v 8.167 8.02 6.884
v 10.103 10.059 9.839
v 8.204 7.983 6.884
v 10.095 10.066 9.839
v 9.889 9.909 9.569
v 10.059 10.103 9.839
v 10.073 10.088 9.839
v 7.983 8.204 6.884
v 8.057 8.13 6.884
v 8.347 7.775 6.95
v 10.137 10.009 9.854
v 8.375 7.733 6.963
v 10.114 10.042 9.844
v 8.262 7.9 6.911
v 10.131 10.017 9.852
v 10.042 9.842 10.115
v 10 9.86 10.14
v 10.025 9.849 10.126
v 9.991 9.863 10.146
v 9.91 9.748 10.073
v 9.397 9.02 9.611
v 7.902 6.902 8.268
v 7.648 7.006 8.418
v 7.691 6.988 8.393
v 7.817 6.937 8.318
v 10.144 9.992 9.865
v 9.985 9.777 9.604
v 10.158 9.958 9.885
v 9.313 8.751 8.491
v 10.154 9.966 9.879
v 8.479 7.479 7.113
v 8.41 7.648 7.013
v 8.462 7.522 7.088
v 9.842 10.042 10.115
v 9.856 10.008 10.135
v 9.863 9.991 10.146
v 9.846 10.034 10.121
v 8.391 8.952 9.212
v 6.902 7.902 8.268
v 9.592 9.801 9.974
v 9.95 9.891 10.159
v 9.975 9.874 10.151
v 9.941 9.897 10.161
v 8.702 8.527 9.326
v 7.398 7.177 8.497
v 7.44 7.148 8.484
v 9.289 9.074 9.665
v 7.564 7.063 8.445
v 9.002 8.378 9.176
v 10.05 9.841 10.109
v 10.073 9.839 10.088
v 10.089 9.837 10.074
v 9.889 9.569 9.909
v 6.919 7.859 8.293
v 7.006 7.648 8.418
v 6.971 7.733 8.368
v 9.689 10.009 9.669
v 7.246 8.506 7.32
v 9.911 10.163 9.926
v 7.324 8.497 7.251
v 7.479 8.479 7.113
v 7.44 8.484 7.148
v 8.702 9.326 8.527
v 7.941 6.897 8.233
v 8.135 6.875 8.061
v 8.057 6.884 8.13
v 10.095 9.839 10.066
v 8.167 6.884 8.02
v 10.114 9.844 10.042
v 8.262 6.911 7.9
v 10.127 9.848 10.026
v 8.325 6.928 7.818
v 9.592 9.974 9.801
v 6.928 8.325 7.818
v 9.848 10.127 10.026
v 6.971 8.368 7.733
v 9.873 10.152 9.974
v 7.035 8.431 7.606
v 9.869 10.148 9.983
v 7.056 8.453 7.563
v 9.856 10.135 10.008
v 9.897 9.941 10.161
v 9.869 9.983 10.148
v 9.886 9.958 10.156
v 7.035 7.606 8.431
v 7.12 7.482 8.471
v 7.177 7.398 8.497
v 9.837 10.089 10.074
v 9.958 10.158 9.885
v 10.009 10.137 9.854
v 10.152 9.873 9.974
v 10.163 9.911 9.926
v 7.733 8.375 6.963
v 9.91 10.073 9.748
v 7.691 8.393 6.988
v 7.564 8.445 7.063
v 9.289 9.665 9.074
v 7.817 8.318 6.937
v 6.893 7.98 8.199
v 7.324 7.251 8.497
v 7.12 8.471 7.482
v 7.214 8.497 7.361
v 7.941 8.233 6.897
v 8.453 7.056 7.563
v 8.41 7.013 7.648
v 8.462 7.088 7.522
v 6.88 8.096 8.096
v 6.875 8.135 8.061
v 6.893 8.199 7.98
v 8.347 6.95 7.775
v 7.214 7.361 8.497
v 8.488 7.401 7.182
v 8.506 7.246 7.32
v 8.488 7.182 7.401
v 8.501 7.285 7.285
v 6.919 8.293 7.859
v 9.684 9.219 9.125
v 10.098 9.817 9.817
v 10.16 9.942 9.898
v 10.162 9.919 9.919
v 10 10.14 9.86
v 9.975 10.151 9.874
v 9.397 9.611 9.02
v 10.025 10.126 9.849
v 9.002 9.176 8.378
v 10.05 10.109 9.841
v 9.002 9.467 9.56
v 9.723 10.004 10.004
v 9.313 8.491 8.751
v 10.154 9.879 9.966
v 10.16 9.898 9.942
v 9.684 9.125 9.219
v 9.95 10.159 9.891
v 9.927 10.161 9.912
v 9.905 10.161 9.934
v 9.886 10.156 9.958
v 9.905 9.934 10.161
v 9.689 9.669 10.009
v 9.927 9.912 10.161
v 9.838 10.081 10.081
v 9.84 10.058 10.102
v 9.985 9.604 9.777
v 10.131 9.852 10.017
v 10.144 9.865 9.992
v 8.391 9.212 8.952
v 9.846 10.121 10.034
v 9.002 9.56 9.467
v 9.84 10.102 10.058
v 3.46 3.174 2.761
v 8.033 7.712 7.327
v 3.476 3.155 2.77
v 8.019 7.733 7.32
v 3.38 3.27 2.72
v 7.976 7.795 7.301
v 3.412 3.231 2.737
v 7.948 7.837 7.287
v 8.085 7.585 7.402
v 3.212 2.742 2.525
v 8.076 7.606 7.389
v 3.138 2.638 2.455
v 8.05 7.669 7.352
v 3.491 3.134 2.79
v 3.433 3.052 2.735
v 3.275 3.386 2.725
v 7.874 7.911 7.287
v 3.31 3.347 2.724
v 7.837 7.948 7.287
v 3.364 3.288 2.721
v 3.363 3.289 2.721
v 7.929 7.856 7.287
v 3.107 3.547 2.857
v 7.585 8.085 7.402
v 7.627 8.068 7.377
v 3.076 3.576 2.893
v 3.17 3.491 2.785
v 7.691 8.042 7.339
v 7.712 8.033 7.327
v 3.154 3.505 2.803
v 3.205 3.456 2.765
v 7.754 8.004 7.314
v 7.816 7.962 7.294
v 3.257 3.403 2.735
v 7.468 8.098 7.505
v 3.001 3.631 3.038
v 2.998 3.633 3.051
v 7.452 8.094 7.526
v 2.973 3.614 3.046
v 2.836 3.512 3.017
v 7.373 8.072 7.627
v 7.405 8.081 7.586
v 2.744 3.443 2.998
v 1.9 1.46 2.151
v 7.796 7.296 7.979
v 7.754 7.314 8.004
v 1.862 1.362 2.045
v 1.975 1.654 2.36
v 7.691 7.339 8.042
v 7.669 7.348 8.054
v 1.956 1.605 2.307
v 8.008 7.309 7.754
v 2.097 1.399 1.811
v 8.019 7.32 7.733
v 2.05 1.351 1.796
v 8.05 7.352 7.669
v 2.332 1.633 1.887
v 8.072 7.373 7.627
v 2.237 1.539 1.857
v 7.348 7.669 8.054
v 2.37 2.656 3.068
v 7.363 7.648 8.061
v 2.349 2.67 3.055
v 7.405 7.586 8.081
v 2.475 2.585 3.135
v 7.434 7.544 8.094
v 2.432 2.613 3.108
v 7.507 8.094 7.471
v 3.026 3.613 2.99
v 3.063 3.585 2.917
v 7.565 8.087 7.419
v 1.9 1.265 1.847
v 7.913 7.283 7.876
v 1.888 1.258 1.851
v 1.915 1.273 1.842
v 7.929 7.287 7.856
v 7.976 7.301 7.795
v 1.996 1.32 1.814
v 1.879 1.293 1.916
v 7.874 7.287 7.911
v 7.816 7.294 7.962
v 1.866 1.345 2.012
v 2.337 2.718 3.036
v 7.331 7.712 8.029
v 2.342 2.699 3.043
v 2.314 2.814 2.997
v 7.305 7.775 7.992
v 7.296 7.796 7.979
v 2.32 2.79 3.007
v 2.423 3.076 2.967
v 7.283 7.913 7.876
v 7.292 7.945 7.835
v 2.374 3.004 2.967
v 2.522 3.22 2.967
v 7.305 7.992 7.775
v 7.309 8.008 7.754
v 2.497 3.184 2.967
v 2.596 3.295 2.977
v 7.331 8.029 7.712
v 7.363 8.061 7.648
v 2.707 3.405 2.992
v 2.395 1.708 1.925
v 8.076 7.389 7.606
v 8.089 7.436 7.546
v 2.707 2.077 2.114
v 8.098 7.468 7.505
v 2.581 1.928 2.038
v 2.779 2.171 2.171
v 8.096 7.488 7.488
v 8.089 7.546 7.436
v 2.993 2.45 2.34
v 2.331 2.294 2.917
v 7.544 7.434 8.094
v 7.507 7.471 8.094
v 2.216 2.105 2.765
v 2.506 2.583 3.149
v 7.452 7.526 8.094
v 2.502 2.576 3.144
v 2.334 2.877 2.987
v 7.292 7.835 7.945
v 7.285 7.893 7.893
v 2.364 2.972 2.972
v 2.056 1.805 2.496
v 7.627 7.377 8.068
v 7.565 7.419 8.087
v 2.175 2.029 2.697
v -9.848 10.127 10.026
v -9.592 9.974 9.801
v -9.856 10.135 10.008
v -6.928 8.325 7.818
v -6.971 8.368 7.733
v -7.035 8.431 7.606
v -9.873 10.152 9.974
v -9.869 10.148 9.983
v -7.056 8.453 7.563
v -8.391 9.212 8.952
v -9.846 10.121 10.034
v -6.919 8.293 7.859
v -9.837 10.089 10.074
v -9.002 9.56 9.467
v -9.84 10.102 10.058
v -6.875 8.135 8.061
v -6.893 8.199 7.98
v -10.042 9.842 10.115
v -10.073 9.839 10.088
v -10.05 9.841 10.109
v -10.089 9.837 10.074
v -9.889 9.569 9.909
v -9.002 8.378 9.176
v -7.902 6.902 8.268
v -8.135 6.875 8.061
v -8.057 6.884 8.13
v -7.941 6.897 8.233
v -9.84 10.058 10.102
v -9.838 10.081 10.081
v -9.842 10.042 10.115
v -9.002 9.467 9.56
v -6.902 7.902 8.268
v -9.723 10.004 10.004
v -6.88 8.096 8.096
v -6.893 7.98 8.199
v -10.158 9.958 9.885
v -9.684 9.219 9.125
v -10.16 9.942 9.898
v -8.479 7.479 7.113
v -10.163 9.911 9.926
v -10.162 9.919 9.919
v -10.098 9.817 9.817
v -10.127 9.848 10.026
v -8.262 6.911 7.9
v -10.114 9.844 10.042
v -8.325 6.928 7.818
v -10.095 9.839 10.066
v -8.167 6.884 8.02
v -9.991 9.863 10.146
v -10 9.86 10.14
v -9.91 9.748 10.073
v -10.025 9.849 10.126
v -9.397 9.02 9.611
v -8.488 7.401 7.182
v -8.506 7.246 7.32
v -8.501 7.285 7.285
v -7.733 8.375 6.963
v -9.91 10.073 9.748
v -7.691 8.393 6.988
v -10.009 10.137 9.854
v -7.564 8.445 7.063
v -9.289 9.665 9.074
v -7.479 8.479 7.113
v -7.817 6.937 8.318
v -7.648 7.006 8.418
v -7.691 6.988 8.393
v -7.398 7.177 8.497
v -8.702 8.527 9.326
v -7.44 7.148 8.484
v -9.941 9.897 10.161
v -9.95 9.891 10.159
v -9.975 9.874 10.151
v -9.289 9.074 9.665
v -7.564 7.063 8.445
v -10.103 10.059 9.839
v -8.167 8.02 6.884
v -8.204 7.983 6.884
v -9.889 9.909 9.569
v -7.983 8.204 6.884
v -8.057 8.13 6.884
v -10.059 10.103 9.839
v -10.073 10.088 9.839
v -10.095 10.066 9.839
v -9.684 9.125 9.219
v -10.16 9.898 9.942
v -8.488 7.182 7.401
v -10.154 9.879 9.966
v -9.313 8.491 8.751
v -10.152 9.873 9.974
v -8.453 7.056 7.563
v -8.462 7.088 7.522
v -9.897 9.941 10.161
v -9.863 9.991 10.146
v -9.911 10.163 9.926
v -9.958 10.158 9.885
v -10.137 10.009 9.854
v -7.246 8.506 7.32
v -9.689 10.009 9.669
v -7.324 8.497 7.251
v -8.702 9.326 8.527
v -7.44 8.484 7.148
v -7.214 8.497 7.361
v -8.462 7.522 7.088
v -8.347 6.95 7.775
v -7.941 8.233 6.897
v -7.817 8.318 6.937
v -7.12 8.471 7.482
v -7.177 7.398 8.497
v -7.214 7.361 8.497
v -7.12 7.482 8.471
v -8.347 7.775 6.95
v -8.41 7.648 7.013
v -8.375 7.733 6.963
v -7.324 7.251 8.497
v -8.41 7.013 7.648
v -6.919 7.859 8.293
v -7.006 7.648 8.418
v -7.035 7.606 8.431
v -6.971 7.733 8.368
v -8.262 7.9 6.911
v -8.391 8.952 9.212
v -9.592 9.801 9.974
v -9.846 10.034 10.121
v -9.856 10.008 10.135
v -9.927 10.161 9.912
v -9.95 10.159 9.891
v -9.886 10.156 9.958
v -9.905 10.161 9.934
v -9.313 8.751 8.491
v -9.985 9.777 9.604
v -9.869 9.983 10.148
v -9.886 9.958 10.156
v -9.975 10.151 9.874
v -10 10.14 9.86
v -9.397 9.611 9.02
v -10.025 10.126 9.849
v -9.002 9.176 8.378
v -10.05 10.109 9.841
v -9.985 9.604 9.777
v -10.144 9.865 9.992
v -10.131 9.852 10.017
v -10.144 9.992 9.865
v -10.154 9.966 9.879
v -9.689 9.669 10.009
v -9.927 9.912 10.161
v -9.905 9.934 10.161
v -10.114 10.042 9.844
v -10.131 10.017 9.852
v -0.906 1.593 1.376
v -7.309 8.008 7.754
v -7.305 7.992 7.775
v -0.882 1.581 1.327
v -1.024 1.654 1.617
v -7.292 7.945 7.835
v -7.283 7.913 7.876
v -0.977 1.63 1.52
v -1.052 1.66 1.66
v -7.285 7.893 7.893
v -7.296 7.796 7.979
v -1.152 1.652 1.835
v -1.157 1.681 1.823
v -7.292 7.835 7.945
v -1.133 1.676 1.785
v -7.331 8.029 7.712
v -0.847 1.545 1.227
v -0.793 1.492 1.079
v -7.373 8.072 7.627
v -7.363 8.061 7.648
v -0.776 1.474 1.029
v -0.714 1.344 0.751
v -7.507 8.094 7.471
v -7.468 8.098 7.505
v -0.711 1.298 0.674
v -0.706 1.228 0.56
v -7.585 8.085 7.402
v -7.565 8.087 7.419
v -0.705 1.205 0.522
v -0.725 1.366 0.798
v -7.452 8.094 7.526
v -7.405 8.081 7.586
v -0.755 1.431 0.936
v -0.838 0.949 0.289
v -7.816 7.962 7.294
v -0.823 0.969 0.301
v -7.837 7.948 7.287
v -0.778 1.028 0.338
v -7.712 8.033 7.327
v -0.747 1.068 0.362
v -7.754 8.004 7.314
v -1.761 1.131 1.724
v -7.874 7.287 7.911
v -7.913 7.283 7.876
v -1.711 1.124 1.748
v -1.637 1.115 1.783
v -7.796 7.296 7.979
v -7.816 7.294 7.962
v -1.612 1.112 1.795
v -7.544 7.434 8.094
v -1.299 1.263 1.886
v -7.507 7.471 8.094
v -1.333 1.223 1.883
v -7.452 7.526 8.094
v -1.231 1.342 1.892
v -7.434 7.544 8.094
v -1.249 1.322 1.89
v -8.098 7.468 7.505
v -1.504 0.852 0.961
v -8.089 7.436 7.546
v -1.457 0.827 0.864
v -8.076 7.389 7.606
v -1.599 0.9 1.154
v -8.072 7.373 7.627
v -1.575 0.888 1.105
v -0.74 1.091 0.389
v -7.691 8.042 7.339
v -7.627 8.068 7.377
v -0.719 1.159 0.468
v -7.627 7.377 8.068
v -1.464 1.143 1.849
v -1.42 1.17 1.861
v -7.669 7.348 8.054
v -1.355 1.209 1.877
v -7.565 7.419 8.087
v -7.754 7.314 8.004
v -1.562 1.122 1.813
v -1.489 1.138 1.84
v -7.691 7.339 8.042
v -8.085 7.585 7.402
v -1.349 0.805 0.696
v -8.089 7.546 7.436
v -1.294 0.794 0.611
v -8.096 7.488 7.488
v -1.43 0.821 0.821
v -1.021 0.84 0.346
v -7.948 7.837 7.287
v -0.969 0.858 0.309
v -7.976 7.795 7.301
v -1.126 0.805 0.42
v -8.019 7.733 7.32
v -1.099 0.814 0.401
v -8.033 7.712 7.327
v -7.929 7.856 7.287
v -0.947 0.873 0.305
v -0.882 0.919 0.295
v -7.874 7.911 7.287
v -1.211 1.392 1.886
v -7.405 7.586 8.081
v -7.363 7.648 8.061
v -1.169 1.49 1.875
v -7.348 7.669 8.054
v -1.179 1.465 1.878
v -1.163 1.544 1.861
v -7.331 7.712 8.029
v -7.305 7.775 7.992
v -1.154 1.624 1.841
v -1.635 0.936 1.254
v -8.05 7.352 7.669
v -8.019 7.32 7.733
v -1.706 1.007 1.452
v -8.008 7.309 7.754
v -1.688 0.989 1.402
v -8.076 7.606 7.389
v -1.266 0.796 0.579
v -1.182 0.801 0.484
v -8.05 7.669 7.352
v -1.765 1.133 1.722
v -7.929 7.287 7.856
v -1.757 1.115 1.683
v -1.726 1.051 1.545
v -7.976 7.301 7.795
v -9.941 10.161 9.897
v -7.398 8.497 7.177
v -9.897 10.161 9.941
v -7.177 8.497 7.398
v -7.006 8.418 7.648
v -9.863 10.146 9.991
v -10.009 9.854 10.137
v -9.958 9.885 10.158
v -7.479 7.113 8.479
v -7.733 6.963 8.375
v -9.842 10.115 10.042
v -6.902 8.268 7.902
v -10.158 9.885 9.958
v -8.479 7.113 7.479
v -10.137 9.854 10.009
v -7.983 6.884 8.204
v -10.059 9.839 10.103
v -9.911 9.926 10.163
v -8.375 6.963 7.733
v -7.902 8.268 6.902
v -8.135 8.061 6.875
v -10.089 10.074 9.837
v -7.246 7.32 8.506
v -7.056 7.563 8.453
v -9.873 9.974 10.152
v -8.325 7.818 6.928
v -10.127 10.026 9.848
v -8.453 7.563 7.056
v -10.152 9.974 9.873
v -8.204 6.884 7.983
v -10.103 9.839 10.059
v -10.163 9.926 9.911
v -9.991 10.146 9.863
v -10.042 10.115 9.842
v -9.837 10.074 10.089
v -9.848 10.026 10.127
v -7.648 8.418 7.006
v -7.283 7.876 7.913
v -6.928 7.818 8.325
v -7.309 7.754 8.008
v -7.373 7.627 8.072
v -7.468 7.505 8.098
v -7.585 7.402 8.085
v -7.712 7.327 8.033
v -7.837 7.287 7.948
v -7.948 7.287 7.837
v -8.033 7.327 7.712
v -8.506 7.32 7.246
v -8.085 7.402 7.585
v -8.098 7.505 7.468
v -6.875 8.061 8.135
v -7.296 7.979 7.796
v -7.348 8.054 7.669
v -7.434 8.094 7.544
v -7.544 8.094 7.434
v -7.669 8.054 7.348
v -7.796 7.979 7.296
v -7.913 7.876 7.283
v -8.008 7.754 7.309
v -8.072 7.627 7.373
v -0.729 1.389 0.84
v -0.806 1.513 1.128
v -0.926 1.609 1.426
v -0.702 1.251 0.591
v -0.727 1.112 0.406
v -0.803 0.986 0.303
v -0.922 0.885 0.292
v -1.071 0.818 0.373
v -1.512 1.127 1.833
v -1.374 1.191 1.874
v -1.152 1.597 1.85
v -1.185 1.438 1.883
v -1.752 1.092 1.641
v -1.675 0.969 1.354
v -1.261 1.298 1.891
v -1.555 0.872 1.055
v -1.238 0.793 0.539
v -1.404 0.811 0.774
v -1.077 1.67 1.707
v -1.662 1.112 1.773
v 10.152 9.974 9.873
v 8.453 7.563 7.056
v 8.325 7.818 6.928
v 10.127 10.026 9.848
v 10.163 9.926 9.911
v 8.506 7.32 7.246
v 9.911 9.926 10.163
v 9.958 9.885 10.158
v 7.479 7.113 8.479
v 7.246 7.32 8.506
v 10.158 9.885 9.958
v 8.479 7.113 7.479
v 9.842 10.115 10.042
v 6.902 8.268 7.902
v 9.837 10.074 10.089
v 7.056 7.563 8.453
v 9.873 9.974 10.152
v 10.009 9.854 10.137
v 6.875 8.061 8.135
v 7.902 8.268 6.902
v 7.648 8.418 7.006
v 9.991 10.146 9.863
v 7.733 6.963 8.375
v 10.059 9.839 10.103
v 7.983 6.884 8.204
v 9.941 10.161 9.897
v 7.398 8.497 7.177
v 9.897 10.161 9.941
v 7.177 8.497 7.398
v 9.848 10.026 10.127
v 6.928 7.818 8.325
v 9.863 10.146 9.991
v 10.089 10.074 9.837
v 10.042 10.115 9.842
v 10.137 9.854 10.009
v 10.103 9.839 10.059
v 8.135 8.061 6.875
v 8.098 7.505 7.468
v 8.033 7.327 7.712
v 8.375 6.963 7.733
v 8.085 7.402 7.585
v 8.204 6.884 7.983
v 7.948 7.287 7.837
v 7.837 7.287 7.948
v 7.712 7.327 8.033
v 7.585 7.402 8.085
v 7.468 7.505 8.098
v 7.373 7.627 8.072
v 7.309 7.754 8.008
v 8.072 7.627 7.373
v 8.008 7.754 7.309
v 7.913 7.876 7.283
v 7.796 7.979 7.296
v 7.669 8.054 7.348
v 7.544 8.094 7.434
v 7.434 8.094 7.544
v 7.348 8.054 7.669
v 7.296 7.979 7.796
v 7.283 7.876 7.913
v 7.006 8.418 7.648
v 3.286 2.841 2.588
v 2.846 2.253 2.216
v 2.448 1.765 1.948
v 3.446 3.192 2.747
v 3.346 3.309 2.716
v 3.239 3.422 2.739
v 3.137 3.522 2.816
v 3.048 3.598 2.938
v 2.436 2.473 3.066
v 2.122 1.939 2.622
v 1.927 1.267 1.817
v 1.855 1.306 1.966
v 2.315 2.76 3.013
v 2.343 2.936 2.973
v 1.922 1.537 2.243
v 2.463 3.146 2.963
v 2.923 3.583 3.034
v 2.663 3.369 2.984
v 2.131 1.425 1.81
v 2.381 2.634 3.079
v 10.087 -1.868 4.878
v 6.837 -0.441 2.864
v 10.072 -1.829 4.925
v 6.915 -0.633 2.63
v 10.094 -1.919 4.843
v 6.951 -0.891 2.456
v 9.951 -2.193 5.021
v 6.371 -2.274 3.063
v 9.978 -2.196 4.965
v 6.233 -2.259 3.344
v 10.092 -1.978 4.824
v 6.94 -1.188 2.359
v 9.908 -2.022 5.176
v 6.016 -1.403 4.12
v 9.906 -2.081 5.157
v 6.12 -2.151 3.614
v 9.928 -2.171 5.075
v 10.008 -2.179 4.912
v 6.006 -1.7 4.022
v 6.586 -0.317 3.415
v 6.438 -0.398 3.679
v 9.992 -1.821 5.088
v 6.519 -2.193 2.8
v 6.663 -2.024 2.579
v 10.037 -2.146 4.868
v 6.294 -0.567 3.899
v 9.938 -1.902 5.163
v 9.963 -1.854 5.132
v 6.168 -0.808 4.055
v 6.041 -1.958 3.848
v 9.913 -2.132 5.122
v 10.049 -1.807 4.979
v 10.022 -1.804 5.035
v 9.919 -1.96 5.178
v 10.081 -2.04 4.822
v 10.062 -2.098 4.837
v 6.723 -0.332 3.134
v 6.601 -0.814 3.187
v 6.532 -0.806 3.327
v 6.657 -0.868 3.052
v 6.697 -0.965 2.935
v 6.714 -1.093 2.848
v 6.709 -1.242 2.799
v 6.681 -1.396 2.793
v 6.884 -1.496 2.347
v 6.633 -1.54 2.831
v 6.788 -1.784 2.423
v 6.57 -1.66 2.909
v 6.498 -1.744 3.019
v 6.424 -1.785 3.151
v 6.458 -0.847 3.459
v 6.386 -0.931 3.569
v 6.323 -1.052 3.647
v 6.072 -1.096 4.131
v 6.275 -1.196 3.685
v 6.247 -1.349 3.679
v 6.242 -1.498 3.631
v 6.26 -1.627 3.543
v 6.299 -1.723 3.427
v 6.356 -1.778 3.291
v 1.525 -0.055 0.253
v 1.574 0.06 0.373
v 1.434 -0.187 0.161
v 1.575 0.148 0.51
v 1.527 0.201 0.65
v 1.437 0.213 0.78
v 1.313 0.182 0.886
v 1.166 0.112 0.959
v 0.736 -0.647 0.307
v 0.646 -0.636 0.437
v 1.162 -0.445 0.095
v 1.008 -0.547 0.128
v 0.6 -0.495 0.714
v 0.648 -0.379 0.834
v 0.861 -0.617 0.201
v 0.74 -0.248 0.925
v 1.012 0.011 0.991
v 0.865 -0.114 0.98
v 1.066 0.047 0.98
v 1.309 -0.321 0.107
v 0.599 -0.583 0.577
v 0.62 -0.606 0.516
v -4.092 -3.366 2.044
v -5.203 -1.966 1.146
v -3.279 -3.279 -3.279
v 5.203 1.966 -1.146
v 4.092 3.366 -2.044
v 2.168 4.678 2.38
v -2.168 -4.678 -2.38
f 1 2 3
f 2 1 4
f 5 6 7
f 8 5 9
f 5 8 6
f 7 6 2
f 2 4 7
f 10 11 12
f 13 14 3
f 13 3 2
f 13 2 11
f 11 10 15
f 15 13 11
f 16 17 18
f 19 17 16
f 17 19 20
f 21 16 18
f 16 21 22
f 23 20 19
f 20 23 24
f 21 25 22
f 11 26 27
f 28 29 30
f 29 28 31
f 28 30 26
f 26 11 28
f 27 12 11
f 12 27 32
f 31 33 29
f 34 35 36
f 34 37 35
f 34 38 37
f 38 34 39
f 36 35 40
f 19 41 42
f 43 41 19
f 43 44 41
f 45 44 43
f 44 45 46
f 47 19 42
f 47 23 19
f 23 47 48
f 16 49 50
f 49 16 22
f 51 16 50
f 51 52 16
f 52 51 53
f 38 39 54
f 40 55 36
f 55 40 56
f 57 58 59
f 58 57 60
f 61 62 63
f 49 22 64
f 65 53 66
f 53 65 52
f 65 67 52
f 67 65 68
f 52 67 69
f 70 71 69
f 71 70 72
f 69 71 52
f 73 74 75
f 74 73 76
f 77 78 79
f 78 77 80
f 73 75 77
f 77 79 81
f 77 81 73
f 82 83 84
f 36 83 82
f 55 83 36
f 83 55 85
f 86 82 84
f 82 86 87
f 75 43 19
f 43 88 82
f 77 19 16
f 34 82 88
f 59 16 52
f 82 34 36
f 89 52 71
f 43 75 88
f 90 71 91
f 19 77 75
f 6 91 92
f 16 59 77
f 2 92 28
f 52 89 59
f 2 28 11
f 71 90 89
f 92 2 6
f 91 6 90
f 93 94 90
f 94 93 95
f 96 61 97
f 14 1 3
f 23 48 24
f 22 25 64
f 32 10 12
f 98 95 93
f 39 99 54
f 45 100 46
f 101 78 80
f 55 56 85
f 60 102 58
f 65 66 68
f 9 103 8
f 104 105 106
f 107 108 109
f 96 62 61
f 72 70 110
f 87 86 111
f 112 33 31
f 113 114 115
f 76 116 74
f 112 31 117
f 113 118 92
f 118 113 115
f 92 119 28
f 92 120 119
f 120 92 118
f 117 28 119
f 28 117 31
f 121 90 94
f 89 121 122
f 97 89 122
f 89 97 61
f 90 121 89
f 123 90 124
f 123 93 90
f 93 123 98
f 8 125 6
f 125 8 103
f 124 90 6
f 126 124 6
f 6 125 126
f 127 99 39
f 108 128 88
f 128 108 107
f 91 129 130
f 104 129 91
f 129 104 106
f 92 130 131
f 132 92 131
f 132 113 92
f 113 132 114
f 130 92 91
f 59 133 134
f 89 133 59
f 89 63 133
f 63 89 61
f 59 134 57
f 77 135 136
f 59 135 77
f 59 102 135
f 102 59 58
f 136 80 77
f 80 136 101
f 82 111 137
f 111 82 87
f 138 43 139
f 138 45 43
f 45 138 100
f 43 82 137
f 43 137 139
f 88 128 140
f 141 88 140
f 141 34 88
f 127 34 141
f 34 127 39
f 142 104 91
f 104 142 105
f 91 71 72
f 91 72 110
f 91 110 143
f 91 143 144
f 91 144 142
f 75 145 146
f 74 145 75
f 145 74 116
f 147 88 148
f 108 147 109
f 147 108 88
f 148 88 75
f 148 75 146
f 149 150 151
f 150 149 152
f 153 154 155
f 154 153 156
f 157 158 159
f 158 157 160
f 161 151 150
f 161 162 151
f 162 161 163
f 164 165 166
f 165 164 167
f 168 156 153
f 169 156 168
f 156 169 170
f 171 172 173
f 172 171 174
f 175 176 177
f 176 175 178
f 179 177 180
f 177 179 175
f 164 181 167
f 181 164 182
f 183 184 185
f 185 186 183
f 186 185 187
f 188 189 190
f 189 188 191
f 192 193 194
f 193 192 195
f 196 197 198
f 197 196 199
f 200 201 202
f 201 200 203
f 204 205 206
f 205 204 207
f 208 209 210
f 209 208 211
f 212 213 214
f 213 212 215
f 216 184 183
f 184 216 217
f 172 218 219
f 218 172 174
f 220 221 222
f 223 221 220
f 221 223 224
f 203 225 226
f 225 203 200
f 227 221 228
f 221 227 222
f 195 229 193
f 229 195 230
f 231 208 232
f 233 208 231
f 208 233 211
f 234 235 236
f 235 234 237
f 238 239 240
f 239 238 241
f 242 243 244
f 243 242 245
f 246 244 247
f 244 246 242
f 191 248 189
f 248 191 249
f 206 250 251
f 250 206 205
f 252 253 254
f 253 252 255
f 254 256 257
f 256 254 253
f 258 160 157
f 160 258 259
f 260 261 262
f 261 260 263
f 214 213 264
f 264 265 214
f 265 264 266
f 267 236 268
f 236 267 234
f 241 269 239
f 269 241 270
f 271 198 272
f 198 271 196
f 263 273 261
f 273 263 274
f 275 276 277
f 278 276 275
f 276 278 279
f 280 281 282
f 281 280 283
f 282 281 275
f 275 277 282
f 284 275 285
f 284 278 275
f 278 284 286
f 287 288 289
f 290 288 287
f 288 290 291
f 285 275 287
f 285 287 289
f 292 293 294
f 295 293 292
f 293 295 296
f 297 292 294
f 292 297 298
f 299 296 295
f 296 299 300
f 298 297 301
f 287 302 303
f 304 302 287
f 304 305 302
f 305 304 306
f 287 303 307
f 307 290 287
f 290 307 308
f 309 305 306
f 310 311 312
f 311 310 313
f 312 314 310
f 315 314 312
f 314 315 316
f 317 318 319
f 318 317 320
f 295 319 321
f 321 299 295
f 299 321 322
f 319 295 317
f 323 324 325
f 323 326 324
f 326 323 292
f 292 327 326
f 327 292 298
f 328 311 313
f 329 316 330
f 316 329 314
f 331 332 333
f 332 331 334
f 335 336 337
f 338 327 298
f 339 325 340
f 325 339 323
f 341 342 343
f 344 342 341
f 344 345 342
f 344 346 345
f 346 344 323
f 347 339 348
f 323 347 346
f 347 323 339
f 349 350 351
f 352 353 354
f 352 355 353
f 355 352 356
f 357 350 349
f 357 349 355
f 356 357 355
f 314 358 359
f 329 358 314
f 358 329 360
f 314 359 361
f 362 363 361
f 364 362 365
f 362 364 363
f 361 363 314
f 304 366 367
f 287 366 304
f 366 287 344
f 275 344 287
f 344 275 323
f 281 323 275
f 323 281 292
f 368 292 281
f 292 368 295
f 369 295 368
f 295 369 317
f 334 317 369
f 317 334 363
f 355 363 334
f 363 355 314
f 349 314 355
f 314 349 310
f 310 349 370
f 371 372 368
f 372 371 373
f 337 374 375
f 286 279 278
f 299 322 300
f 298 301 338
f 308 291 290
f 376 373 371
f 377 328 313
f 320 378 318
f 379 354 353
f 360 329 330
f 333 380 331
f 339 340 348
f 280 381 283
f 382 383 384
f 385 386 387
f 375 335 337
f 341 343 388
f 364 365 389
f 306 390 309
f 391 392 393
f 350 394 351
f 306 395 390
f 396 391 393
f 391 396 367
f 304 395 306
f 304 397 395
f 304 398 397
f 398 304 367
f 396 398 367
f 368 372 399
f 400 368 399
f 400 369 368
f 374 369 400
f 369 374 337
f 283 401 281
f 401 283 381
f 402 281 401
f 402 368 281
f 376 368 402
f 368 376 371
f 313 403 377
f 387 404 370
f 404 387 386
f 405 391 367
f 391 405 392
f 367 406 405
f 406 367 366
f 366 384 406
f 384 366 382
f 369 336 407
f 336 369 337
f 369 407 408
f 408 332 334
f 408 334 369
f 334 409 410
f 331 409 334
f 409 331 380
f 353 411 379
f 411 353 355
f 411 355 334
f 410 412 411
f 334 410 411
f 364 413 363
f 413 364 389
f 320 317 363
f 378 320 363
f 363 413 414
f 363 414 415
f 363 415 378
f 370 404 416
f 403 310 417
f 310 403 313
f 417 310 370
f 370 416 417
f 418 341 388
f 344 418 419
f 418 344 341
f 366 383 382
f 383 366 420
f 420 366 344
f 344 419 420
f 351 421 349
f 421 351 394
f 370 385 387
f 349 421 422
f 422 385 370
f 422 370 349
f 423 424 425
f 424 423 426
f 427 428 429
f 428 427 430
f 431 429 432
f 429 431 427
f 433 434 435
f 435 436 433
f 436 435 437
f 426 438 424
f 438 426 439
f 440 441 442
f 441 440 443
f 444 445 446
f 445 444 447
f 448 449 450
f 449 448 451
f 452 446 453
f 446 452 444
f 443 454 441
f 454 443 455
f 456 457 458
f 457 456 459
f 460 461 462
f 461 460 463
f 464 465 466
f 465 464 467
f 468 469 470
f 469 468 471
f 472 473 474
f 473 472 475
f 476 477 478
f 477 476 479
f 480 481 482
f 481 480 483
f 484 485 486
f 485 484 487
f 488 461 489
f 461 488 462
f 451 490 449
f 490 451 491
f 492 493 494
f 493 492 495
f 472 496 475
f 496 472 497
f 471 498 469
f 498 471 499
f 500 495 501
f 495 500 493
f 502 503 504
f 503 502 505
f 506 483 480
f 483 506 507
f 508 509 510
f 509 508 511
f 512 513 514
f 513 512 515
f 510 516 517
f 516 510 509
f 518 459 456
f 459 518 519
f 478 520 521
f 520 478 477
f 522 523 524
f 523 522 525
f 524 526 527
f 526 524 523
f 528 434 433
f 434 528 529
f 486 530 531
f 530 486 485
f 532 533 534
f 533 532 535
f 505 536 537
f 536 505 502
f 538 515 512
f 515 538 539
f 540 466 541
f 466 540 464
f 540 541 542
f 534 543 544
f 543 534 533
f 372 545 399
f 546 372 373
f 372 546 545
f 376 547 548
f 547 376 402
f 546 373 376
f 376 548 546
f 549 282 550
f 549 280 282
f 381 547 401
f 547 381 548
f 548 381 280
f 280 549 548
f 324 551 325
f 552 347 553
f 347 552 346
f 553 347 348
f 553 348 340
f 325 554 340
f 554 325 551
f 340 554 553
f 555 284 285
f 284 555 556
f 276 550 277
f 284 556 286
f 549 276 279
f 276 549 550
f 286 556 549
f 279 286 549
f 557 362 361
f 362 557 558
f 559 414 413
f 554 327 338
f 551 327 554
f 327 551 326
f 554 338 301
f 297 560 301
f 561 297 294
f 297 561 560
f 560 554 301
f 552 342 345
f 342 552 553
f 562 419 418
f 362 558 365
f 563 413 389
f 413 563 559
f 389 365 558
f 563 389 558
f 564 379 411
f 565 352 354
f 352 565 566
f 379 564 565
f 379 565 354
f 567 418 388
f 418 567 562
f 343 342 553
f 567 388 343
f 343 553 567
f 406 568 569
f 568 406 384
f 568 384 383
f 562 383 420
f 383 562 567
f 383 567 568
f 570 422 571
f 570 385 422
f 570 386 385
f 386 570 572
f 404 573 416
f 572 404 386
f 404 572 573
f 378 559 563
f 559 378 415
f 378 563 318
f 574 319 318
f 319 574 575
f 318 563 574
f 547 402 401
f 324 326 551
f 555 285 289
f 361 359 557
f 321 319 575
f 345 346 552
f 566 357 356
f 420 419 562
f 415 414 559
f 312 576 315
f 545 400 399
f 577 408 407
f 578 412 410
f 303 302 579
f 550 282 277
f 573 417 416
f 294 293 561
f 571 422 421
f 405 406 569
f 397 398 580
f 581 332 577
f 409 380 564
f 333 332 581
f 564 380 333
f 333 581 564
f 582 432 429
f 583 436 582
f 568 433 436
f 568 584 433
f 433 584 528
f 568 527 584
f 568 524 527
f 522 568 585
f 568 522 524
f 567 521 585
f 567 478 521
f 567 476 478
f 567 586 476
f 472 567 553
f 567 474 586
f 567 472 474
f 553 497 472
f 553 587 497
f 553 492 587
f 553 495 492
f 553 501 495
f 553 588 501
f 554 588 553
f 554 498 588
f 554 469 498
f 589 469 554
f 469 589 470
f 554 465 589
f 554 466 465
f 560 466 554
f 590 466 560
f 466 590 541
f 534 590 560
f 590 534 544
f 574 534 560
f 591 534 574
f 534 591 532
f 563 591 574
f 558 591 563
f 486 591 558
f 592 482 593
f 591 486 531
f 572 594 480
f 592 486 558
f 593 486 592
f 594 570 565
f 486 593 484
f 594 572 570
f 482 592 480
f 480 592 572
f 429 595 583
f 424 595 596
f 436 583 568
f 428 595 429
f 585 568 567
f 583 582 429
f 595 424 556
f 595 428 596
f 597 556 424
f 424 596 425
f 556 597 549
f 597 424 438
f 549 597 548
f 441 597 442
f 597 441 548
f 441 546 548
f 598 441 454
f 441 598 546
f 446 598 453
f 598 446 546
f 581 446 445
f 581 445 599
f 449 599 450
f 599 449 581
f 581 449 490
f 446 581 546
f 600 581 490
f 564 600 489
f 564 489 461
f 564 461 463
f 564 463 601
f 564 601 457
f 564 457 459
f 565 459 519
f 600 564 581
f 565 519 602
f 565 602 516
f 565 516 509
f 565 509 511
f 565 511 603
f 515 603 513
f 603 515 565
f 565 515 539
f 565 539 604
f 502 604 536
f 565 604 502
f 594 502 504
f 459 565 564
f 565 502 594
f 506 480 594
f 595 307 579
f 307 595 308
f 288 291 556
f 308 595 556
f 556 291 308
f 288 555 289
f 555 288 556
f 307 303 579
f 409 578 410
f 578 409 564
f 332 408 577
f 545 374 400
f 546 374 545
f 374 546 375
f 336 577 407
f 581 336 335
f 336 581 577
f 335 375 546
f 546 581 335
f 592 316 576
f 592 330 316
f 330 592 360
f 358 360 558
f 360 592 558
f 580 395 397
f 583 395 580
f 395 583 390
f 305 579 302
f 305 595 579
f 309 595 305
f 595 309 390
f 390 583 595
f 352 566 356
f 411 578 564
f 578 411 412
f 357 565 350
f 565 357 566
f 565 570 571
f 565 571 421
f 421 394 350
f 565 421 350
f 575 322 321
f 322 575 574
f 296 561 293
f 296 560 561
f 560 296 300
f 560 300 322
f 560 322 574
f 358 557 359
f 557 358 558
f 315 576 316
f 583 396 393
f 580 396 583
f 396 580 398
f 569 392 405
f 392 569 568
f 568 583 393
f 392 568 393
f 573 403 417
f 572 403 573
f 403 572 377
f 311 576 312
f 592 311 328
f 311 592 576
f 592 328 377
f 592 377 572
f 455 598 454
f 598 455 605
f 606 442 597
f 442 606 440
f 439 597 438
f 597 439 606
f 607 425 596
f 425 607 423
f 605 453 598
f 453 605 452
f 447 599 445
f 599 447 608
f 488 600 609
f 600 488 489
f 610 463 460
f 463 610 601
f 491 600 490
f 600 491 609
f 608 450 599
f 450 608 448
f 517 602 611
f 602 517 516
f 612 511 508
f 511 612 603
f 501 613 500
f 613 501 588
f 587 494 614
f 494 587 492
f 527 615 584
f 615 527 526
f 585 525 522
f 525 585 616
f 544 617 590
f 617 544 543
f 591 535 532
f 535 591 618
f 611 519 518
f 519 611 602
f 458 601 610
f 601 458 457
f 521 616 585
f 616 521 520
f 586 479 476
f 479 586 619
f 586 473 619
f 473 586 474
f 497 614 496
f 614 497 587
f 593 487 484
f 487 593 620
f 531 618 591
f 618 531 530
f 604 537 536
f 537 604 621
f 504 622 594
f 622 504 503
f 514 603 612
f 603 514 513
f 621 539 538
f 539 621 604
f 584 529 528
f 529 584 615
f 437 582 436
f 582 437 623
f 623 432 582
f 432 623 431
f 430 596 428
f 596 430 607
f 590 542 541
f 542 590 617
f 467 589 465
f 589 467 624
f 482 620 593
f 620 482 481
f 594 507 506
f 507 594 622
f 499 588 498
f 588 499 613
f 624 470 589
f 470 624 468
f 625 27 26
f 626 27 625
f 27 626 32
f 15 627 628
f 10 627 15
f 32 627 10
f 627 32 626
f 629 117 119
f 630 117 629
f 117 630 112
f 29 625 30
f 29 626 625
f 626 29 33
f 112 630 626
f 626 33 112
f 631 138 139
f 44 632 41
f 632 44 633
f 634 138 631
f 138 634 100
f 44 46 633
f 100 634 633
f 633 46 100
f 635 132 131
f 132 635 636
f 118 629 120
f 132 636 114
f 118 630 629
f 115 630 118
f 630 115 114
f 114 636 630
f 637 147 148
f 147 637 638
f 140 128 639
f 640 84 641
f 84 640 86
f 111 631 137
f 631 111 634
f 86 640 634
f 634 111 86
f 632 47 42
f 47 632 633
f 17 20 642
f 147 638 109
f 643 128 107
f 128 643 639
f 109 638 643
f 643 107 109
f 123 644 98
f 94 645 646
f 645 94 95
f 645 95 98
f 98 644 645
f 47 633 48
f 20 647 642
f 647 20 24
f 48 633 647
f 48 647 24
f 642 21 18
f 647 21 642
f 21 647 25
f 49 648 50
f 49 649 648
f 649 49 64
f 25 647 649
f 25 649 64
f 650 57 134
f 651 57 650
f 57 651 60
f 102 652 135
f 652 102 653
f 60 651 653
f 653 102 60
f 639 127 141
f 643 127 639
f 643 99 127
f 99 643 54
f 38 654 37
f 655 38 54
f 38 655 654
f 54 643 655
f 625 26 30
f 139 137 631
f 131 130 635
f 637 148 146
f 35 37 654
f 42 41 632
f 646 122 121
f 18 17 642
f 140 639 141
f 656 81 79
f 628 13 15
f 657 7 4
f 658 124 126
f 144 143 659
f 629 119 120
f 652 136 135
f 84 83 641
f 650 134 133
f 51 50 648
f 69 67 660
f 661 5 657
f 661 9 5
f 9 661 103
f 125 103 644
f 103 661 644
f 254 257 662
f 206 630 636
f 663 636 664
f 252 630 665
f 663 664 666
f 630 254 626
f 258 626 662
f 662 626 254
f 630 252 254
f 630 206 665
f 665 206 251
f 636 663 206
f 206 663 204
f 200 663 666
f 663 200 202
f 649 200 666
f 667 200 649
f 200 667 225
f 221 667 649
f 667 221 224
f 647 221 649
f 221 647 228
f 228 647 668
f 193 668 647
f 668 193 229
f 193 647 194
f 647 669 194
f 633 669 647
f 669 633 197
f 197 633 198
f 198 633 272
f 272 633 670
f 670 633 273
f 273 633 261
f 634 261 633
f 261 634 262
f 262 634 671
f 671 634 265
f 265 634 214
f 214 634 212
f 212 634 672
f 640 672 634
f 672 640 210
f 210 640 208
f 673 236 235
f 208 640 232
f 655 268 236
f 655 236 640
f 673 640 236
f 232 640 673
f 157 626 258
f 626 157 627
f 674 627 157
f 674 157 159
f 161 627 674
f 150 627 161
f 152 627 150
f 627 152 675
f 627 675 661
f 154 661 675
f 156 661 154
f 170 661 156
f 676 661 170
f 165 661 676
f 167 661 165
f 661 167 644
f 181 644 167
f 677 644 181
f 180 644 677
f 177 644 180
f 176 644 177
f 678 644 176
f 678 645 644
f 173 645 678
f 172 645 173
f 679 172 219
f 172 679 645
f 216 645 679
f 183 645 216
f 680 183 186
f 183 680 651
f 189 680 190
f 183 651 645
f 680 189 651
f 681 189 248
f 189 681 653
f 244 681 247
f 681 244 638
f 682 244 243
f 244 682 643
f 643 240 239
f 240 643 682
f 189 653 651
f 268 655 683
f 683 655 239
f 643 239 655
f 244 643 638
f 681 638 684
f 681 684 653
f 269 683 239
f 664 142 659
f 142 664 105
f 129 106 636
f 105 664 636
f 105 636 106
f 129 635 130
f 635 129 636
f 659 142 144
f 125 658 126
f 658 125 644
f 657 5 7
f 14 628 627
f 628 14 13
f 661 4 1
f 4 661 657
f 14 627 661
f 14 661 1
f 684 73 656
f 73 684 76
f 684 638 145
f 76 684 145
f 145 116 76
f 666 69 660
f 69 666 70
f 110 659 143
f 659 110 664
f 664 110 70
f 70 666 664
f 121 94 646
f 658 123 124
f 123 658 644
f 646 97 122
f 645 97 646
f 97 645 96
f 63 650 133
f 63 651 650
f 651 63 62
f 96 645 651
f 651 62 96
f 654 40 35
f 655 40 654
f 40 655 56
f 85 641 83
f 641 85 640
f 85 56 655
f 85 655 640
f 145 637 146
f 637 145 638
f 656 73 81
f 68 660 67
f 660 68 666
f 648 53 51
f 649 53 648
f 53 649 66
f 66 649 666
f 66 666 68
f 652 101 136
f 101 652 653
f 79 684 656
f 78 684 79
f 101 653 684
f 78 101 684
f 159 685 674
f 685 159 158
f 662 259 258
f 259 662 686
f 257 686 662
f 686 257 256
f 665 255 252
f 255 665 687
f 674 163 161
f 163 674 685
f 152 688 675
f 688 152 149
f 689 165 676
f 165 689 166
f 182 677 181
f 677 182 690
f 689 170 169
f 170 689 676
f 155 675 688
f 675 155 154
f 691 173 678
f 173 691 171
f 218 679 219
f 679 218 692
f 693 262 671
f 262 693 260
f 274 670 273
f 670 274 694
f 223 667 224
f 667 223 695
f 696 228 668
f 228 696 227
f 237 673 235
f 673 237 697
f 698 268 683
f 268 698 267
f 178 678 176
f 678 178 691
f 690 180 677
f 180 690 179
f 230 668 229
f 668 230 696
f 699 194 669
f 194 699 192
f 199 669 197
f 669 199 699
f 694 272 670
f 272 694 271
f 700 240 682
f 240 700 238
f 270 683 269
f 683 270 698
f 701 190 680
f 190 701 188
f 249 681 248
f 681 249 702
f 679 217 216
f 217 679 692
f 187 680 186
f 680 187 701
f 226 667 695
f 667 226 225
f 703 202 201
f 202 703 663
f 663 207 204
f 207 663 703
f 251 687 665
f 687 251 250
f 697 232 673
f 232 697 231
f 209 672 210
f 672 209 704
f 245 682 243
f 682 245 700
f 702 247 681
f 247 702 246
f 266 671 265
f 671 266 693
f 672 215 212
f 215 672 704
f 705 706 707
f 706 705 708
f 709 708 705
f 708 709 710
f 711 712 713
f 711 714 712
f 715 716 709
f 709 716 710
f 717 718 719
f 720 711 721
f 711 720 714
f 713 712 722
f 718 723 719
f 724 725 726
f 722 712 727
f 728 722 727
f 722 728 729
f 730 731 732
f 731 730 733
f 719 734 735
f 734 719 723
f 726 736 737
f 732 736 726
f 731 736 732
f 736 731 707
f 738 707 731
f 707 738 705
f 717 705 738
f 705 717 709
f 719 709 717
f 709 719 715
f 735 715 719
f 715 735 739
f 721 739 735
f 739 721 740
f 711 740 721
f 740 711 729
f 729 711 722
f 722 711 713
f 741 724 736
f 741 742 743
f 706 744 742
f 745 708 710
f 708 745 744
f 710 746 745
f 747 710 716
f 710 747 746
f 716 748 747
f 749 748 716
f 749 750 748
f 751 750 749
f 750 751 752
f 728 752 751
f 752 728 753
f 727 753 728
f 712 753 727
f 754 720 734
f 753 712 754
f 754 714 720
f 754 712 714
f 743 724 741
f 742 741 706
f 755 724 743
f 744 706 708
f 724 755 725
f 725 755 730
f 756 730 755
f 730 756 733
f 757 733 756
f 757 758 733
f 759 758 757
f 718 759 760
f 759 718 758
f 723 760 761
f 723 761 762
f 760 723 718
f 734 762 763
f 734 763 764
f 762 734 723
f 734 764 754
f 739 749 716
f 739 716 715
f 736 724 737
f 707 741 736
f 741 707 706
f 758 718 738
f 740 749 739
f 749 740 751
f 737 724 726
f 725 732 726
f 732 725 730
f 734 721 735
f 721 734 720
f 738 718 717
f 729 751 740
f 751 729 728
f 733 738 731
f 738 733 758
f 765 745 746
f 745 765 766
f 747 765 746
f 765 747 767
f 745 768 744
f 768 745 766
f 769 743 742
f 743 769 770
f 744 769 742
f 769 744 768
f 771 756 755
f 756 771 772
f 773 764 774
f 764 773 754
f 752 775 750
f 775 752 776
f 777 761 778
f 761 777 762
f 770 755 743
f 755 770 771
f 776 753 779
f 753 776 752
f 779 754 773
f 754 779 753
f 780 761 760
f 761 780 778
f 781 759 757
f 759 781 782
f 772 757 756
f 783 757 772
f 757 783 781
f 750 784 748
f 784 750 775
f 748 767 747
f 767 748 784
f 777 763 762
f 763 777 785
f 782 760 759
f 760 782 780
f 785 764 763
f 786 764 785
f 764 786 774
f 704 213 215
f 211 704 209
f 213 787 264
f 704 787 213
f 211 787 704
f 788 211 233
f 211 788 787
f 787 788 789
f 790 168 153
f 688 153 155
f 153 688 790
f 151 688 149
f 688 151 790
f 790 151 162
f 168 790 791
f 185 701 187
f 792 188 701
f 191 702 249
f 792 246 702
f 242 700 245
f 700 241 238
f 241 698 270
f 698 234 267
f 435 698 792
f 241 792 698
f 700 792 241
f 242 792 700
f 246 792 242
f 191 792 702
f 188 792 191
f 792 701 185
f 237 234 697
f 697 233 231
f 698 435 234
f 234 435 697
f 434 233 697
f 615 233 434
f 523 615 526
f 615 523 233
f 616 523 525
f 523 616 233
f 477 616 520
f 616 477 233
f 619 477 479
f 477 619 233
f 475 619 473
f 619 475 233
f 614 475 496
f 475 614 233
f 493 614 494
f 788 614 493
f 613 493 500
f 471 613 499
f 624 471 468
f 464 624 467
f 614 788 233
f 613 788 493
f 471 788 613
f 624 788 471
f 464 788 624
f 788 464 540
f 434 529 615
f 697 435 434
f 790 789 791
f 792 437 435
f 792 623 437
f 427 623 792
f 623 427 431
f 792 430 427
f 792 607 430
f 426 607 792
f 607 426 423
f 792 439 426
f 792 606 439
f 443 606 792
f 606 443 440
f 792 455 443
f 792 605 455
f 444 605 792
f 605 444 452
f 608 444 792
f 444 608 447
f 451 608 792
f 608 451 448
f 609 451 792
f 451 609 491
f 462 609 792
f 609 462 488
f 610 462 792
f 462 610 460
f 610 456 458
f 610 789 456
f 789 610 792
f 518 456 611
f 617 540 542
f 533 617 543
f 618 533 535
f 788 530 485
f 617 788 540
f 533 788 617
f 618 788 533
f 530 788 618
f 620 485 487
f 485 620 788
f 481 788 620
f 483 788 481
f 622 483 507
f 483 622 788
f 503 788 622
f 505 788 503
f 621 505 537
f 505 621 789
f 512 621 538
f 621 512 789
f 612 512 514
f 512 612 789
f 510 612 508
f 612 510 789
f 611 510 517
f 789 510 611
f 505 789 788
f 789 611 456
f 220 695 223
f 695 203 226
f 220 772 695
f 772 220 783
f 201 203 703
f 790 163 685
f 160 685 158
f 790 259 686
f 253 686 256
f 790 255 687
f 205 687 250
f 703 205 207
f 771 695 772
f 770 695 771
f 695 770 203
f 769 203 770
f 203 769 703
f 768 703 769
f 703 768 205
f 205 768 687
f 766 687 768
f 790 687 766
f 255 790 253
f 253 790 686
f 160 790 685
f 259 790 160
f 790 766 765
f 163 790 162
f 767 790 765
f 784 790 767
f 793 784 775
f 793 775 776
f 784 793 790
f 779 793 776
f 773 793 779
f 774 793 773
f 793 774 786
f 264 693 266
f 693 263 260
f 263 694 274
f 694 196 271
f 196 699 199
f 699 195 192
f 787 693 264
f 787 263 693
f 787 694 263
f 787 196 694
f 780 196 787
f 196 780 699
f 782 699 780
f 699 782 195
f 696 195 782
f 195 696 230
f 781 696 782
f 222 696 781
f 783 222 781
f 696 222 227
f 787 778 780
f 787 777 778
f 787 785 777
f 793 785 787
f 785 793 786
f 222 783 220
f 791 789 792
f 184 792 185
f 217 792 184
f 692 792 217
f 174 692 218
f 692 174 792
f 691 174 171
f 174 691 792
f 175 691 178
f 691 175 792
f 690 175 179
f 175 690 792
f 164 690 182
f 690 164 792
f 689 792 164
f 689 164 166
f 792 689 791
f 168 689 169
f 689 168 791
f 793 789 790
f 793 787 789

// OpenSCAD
//---------------------------------------------------------------
//-- Openscad vector library
//-- This is a component of the obiscad opescad tools by Obijuan
//-- (C) Juan Gonzalez-Gomez (Obijuan)
//-- Sep-2012
//---------------------------------------------------------------
//-- Released under the GPL license
//---------------------------------------------------------------

//-- Updated orientate function to correct singularity when v lies along vref

//----------------------------------------
//-- FUNCTIONS FOR WORKING WITH VECTORS
//----------------------------------------

//-- Calculate the module of a vector
function mod(v) = (sqrt(v[0]*v[0]+v[1]*v[1]+v[2]*v[2]));

//-- Calculate the cros product of two vectors
function cross(u,v) = [
  u[1]*v[2] - v[1]*u[2],
  -(u[0]*v[2] - v[0]*u[2]) ,
  u[0]*v[1] - v[0]*u[1]];

//-- Calculate the dot product of two vectors
function dot(u,v) = u[0]*v[0]+u[1]*v[1]+u[2]*v[2];

//-- Return the unit vector of a vector
function unitv(v) = v/mod(v);

//-- Return the angle between two vectores
function anglev(u,v) = acos( dot(u,v) / (mod(u)*mod(v)) );

//----------------------------------------------------------
//--  Draw a point in the position given by the vector p  
//----------------------------------------------------------
module point(p)
{
  translate(p)
    sphere(r=0.7,$fn=20);
}

//------------------------------------------------------------------
//-- Draw a vector poiting to the z axis
//-- This is an auxiliary module for implementing the vector module
//--
//-- Parameters:
//--  l: total vector length (line + arrow)
//--  l_arrow: Vector arrow length
//--  mark: If true, a mark is draw in the vector head, for having
//--    a visual reference of the rolling angle
//------------------------------------------------------------------
module vectorz(l=10, l_arrow=4, mark=false)
{
  //-- vector body length (not including the arrow)
  lb = l - l_arrow;

  //-- The vector is locatead at 0,0,0
  translate([0,0,lb/2])
  union() {

    //-- Draw the arrow
    translate([0,0,lb/2])
      cylinder(r1=2/2, r2=0.2, h=l_arrow, $fn=20);

    //-- Draw the mark
    if (mark) {
      translate([0,0,lb/2+l_arrow/2])
      translate([1,0,0])
        cube([2,0.3,l_arrow*0.8],center=true);
    }

    //-- Draw the body
    cylinder(r=1/2, h=lb, center=true, $fn=20);
  }

  //-- Draw a sphere in the vector base
  sphere(r=1/2, $fn=20);
}

//-----------------------------------------------------------------
//-- ORIENTATE OPERATOR
//--
//--  Orientate an object to the direction given by the vector v
//--  Parameters:
//--    v : Target orientation
//--    vref: Vector reference. It is the vector of the local frame
//--          of the object that want to be poiting in the direction
//--          of v
//--    roll: Rotation of the object around the v axis
//-------------------------------------------------------------------
module orientate(v,vref=[0,0,1], roll=0)
{
  //-- Calculate the rotation axis
  raxis = v[0]==vref[0] && v[1]==vref[1] ? [0,1,0] : cross(vref,v);
  
  //-- Calculate the angle between the vectors
  ang = anglev(vref,v);

  //-- Rotate the children!
  rotate(a=roll, v=v)
    rotate(a=ang, v=raxis)
      children(0);
}

module orientate2(v,vref=[0,0,1], roll=0)
{
  //-- Calculate the rotation axis
  raxis = cross(vref,v);
  
  //-- Calculate the angle between the vectors
  ang = anglev(vref,v);

  //-- Rotate the children!
  rotate(a=roll, v=v)
    rotate(a=ang, v=raxis)
      children(0);
}

//---------------------------------------------------------------------------
//-- Draw a vector 
//--
//-- There are two modes of drawing the vector
//-- * Mode 1: Given by a cartesian point(x,y,z). A vector from the origin
//--           to the end (x,y,z) is drawn. The l parameter (length) must 
//--           be 0  (l=0)
//-- * Mode 2: Give by direction and length
//--           A vector of length l pointing to the direction given by
//--           v is drawn
//---------------------------------------------------------------------------
//-- Parameters:
//--  v: Vector cartesian coordinates
//--  l: total vector length (line + arrow)
//--  l_arrow: Vector arrow length
//    mark: If true, a mark is draw in the vector head, for having
//--    a visual reference of the rolling angle
//---------------------------------------------------------------------------
module vector(v,l=0, l_arrow=4, mark=false)
{
  //-- Get the vector length from the coordinates
  mod = mod(v);

  //-- The vector is very easy implemented by means of the orientate
  //-- operator:
  //--  orientate(v) vectorz(l=mod, l_arrow=l_arrow)
  //--  BUT... in OPENSCAD 2012.02.22 the recursion does not
  //--    not work, so that if the user use the orientate operator
  //--    on a vector, openscad will ignore it..
  //-- The solution at the moment (I hope the openscad developers
  //--  implement the recursion in the near future...)
  //--  is to repite the orientate operation in this module

  //---- SAME CALCULATIONS THAN THE ORIENTATE OPERATOR!
  //-- Calculate the rotation axis

  vref = [0,0,1];
  raxis = cross(vref,v);
  
  //-- Calculate the angle between the vectors
  ang = anglev(vref,v);

  //-- orientate the vector
  //-- Draw the vector. The vector length is given either
  //--- by the mod variable (when l=0) or by l (when l!=0)
  if (l==0)
    rotate(a=ang, v=raxis)
      vectorz(l=mod, l_arrow=l_arrow, mark=mark);
  else
    rotate(a=ang, v=raxis)
      vectorz(l=l, l_arrow=l_arrow, mark=mark);

}

//----------------------------------------------------
//-- Draw a Frame of reference
//-- Parameters:
//-- l: length of the Unit vectors
//-----------------------------------------------------
module frame(l=10, l_arrow=4)
{

  //-- Z unit vector
  color("Blue")
    vector([0,0,l], l_arrow=l_arrow);

  //-- X unit vector
  color("Red")
    vector([l,0,0], l_arrow=l_arrow );

  //-- Y unit vector
  color("Green")
    vector([0,l,0],l_arrow=l_arrow);

  //-- Origin
  color("Gray")
    sphere(r=1, $fn=20);
}

//--------------------------------------------------
//-- Modules for testings and examples
//-- Testing that the vector library is working ok
//--------------------------------------------------

//-- 22 vectors in total are drawn, poiting to different directions
module Test_vectors1()
{

  a = 20;
  k = 1;

  //--  Add a frame of reference (in the origin)
  frame(l=a);

  //-- Negative vectors, pointing towards the three axis: -x, -y, -z
  color("Red")   vector([-a, 0,  0]);
  color("Green") vector([0, -a,  0]);
  color("Blue")  vector([0,  0, -a]);

  //-- It is *not* has been implemented using a for loop on purpose
  //-- This way, individual vectors can be commented out or highlighted

  //-- vectors with positive z
  vector([a,   a, a*k]);
  vector([0,   a, a*k]);
  vector([-a,  a, a*k]);
  vector([-a,  0, a*k]);

  vector([-a, -a, a*k]);
  vector([0,  -a, a*k]);
  vector([a,  -a, a*k]);
  vector([a,   0, a*k]);


  //-- Vectors with negative z
  vector([a,   a, -a*k]);
  vector([0,   a, -a*k]);
  vector([-a,  a, -a*k]);
  vector([-a,  0, -a*k]);

  vector([-a, -a, -a*k]);
  vector([0,  -a, -a*k]);
  vector([a,  -a, -a*k]);
  vector([a,   0, -a*k]);
}

//--- Another test...
module Test_vectors2()
{

  //-- Add the vector into the vector table
  //-- This vectors are taken as directions
  //-- All the vectors will be drawn with the same length (l)
  vector_table = [
    [1,   1, 1],
    [0,   1, 1],
    [-1,  1, 1],
    [-1,  0, 1],
    [-1, -1, 1],
    [0,  -1, 1],
    [1,  -1, 1],
    [1,   0, 1],
  
    [1,   1, -1],
    [0,   1, -1],
    [-1,  1, -1],
    [-1,  0, -1],
    [-1, -1, -1],
    [0,  -1, -1],
    [1,  -1, -1],
    [1,   0, -1],
  ];

  //-- Vector length
  l=20;

  frame(l=10);

  //-- Draw all the vector given in the table
  //-- The vectors point to the direction given in the table
  //-- They all are drawn with a length equal to l
  for (v=vector_table) {
    //-- Vector given by direction and length
    vector(v,l=l);
  }
}


//-- Test the cross product and the angle
//-- between vectors
module Test_vector3()
{
  //-- Start with 2 unit vectors
  v=unitv([1,1,1]);
  u=unitv([0,1,0]);

  //-- Draw the vector in different colors
  //-- Increase the length for drawing
  color("Red") vector(v*20);
  color("blue") vector(u*20);

  //-- Get the cross product
  w = cross(v,u);
  vector(w*20);

  //-- The cross product is NOT conmutative... 
  //-- change the order of v and u
  w2 = cross(u,v);
  vector(w2*20);

  //-- w should be perpendicular to v and u
  //-- Calculate the angles between them:
  echo("U , V: ", anglev(u,v));
  echo("W , U: ", anglev(w,u));
  echo("W , V: ", anglev(w,v));

}

//-- Test the orientate operator
module Test_vector4()
{
  o = [10,10,10];
  v = [-10,10,10];

  color("Red") vector(o);
  color("Blue") vector(v);

  //-- Orientate the vector o in the direction of v
  orientate(v,o)
    vector(o);

  //-- Inverse operation: orientate the v vector in the direction
  //-- of o
  orientate(o,v)
    vector(v);

  //-- Example of orientation of a cube
  orientate(o,vref=[10,-2,5],roll=0)
    cube([10,2,5],center=true);

  vector([10,-2,5]);

}

//-------- Perform tests......

Test_vector4();


/*

Test_vectors1();


translate([60,0,0]) 
  Test_vectors2();
*/
